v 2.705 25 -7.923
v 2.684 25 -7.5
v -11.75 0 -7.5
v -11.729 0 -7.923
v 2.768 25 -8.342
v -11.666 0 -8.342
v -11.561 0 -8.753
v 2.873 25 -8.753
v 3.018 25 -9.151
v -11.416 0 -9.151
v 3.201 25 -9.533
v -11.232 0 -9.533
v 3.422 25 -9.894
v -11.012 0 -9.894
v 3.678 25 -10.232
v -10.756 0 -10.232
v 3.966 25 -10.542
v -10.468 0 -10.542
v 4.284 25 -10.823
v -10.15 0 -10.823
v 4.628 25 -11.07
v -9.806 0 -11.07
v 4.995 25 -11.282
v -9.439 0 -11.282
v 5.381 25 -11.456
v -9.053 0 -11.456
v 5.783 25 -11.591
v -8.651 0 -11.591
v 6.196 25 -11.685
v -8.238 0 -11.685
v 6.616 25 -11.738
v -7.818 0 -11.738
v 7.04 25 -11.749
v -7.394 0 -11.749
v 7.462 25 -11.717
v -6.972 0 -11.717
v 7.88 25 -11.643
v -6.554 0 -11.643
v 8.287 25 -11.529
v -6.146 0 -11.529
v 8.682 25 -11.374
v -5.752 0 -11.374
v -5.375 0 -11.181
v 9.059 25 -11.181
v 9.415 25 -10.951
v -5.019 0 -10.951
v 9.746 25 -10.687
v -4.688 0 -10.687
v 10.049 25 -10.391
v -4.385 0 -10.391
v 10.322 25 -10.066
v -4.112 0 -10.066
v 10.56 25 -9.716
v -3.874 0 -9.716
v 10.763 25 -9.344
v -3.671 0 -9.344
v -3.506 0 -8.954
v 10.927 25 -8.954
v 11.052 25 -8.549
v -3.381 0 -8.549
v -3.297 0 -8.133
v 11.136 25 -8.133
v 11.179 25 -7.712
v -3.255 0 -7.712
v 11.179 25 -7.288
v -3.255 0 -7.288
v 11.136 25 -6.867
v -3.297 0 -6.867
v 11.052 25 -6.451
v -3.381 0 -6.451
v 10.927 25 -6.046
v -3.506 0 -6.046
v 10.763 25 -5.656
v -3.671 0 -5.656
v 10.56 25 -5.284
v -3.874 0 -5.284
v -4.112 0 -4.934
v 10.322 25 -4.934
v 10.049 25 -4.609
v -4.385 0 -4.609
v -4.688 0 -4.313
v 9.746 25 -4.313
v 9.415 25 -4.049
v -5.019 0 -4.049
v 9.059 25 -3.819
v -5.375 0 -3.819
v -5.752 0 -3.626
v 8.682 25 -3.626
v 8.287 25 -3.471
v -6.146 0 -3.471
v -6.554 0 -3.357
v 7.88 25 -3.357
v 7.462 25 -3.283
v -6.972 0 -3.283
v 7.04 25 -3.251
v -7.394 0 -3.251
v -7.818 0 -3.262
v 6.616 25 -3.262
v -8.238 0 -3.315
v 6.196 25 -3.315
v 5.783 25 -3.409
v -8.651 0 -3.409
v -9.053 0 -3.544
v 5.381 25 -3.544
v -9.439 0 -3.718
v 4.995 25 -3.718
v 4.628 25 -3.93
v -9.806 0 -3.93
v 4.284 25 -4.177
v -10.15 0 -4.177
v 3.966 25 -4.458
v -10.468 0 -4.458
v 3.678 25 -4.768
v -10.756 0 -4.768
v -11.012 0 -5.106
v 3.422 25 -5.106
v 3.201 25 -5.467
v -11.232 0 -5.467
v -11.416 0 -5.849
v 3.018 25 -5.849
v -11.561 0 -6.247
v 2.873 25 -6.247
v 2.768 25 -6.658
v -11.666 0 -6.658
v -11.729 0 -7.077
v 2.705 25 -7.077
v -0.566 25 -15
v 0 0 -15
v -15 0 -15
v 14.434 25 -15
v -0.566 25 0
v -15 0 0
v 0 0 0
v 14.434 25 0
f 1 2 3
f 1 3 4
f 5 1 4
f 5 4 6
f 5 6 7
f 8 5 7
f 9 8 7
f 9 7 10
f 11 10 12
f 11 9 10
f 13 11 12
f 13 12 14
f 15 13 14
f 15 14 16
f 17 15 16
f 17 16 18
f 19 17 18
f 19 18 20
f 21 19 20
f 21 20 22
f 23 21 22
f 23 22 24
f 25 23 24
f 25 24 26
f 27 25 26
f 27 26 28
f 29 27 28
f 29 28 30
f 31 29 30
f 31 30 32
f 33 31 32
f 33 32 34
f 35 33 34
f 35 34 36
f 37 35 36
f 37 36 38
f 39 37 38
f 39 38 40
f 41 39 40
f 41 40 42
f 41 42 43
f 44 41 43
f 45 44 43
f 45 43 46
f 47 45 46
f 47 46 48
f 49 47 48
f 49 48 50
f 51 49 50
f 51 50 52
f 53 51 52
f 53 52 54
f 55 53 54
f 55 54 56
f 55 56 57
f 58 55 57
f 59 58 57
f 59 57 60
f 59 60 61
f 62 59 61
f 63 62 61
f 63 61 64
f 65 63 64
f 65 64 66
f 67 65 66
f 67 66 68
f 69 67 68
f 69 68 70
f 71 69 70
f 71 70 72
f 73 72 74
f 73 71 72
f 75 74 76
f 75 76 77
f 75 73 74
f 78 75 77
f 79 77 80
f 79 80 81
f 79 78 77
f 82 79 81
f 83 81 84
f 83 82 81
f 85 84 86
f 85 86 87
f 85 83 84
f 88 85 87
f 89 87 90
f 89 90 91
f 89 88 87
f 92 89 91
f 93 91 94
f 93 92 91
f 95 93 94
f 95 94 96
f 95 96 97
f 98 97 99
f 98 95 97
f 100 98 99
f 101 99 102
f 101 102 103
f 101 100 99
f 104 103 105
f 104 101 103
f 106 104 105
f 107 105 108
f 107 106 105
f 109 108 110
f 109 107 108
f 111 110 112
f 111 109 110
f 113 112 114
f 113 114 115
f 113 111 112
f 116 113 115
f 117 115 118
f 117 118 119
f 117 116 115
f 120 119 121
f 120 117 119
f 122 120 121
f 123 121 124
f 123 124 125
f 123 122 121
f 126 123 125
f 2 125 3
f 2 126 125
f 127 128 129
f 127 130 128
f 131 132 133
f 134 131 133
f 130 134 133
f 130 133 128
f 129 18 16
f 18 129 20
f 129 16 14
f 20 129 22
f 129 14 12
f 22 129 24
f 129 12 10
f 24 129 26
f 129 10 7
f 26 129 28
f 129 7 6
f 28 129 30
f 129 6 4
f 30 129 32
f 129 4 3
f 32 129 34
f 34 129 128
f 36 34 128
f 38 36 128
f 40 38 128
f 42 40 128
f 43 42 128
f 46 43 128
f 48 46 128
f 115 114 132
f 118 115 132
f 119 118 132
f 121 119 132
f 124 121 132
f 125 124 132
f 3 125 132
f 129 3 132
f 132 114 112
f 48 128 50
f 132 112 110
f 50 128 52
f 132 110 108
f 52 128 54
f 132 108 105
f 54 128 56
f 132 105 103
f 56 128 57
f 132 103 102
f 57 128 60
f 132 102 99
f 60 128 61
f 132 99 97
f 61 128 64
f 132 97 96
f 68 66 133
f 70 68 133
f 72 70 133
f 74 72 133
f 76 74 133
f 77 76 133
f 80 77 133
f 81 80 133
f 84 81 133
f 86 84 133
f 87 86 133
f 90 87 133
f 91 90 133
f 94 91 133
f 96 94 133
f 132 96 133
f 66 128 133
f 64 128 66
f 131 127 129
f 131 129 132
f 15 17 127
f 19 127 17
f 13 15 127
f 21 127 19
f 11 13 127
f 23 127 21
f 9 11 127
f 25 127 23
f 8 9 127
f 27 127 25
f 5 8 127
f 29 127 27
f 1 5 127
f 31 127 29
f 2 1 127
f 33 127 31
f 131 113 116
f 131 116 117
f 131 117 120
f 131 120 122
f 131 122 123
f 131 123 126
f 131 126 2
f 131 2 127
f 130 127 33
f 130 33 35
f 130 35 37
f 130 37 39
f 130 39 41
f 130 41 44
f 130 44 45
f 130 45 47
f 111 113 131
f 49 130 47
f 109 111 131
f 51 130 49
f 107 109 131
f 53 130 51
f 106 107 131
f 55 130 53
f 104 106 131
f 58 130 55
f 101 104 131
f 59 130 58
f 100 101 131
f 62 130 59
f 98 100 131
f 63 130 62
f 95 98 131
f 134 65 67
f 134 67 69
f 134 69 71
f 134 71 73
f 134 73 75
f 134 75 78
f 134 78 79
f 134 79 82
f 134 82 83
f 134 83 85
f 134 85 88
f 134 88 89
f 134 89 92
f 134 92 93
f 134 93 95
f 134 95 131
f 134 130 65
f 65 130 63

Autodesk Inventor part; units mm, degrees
ref_plane "YZ Plane" through (0, 0, 0) normal (1, 0, 0) x (0, 1, 0)
ref_plane "XZ Plane" through (0, 0, 0) normal (0, 1, 0) x (-1, 0, 0)
ref_plane "XY Plane" through (0, 0, 0) normal (0, 0, 1) x (1, 0, 0)
sketch "Sketch1" plane through (0, 0, 0) normal (0, 1, 0) x (-1, 0, 0)
  line L0 (0, 0) -> (15, 0)
  line L1 (15, 0) -> (15, -15)
  line L2 (15, -15) -> (0, -15)
  line L3 (0, -15) -> (0, 0)
  circle A0 centre (7.5, -7.5) radius 4.25
  dimension "soporte_largo" = 15
  dimension "soporte_ancho" = 15
  dimension "soporte_hueco_diametro" = 8.5
  dimension "soporte_hueco_pos_ancho" = 7.5
  dimension "soporte_hueco_pos_largo" = 7.5
sketch "Sketch2" plane through (0, 0, 0) normal (0, 0, 1) x (1, 0, 0)
  line L0 (0, 0) -> (14.4338, 25)
  line L1 (0, 0) -> (28.8675, 0) construction
  dimension "soporte_inclinacion" = 60
  dimension "soporte_alterura" = 25
sweep "Sweep1" add profiles "Sketch1" path "Sketch2"
equation "\"soporte_hueco_pos_ancho\" = 0.5 * soporte_ancho"
equation "\"soporte_hueco_pos_largo\" = 0.5 * soporte_largo"
equation "\"tol1\" = 0.1"
equation "\"tol2\" = 0.2"
equation "\"tol3\" = 0.3"
equation "\"tol4\" = 0.4"
equation "\"tol5\" = 0.5"
equation "\"tol6\" = 0.6"
equation "\"tol7\" = 0.7"
equation "\"tol8\" = 0.8"
equation "\"tol9\" = 0.9"
equation "\"tol\" = 7"
properties part number "TestSoporte"
